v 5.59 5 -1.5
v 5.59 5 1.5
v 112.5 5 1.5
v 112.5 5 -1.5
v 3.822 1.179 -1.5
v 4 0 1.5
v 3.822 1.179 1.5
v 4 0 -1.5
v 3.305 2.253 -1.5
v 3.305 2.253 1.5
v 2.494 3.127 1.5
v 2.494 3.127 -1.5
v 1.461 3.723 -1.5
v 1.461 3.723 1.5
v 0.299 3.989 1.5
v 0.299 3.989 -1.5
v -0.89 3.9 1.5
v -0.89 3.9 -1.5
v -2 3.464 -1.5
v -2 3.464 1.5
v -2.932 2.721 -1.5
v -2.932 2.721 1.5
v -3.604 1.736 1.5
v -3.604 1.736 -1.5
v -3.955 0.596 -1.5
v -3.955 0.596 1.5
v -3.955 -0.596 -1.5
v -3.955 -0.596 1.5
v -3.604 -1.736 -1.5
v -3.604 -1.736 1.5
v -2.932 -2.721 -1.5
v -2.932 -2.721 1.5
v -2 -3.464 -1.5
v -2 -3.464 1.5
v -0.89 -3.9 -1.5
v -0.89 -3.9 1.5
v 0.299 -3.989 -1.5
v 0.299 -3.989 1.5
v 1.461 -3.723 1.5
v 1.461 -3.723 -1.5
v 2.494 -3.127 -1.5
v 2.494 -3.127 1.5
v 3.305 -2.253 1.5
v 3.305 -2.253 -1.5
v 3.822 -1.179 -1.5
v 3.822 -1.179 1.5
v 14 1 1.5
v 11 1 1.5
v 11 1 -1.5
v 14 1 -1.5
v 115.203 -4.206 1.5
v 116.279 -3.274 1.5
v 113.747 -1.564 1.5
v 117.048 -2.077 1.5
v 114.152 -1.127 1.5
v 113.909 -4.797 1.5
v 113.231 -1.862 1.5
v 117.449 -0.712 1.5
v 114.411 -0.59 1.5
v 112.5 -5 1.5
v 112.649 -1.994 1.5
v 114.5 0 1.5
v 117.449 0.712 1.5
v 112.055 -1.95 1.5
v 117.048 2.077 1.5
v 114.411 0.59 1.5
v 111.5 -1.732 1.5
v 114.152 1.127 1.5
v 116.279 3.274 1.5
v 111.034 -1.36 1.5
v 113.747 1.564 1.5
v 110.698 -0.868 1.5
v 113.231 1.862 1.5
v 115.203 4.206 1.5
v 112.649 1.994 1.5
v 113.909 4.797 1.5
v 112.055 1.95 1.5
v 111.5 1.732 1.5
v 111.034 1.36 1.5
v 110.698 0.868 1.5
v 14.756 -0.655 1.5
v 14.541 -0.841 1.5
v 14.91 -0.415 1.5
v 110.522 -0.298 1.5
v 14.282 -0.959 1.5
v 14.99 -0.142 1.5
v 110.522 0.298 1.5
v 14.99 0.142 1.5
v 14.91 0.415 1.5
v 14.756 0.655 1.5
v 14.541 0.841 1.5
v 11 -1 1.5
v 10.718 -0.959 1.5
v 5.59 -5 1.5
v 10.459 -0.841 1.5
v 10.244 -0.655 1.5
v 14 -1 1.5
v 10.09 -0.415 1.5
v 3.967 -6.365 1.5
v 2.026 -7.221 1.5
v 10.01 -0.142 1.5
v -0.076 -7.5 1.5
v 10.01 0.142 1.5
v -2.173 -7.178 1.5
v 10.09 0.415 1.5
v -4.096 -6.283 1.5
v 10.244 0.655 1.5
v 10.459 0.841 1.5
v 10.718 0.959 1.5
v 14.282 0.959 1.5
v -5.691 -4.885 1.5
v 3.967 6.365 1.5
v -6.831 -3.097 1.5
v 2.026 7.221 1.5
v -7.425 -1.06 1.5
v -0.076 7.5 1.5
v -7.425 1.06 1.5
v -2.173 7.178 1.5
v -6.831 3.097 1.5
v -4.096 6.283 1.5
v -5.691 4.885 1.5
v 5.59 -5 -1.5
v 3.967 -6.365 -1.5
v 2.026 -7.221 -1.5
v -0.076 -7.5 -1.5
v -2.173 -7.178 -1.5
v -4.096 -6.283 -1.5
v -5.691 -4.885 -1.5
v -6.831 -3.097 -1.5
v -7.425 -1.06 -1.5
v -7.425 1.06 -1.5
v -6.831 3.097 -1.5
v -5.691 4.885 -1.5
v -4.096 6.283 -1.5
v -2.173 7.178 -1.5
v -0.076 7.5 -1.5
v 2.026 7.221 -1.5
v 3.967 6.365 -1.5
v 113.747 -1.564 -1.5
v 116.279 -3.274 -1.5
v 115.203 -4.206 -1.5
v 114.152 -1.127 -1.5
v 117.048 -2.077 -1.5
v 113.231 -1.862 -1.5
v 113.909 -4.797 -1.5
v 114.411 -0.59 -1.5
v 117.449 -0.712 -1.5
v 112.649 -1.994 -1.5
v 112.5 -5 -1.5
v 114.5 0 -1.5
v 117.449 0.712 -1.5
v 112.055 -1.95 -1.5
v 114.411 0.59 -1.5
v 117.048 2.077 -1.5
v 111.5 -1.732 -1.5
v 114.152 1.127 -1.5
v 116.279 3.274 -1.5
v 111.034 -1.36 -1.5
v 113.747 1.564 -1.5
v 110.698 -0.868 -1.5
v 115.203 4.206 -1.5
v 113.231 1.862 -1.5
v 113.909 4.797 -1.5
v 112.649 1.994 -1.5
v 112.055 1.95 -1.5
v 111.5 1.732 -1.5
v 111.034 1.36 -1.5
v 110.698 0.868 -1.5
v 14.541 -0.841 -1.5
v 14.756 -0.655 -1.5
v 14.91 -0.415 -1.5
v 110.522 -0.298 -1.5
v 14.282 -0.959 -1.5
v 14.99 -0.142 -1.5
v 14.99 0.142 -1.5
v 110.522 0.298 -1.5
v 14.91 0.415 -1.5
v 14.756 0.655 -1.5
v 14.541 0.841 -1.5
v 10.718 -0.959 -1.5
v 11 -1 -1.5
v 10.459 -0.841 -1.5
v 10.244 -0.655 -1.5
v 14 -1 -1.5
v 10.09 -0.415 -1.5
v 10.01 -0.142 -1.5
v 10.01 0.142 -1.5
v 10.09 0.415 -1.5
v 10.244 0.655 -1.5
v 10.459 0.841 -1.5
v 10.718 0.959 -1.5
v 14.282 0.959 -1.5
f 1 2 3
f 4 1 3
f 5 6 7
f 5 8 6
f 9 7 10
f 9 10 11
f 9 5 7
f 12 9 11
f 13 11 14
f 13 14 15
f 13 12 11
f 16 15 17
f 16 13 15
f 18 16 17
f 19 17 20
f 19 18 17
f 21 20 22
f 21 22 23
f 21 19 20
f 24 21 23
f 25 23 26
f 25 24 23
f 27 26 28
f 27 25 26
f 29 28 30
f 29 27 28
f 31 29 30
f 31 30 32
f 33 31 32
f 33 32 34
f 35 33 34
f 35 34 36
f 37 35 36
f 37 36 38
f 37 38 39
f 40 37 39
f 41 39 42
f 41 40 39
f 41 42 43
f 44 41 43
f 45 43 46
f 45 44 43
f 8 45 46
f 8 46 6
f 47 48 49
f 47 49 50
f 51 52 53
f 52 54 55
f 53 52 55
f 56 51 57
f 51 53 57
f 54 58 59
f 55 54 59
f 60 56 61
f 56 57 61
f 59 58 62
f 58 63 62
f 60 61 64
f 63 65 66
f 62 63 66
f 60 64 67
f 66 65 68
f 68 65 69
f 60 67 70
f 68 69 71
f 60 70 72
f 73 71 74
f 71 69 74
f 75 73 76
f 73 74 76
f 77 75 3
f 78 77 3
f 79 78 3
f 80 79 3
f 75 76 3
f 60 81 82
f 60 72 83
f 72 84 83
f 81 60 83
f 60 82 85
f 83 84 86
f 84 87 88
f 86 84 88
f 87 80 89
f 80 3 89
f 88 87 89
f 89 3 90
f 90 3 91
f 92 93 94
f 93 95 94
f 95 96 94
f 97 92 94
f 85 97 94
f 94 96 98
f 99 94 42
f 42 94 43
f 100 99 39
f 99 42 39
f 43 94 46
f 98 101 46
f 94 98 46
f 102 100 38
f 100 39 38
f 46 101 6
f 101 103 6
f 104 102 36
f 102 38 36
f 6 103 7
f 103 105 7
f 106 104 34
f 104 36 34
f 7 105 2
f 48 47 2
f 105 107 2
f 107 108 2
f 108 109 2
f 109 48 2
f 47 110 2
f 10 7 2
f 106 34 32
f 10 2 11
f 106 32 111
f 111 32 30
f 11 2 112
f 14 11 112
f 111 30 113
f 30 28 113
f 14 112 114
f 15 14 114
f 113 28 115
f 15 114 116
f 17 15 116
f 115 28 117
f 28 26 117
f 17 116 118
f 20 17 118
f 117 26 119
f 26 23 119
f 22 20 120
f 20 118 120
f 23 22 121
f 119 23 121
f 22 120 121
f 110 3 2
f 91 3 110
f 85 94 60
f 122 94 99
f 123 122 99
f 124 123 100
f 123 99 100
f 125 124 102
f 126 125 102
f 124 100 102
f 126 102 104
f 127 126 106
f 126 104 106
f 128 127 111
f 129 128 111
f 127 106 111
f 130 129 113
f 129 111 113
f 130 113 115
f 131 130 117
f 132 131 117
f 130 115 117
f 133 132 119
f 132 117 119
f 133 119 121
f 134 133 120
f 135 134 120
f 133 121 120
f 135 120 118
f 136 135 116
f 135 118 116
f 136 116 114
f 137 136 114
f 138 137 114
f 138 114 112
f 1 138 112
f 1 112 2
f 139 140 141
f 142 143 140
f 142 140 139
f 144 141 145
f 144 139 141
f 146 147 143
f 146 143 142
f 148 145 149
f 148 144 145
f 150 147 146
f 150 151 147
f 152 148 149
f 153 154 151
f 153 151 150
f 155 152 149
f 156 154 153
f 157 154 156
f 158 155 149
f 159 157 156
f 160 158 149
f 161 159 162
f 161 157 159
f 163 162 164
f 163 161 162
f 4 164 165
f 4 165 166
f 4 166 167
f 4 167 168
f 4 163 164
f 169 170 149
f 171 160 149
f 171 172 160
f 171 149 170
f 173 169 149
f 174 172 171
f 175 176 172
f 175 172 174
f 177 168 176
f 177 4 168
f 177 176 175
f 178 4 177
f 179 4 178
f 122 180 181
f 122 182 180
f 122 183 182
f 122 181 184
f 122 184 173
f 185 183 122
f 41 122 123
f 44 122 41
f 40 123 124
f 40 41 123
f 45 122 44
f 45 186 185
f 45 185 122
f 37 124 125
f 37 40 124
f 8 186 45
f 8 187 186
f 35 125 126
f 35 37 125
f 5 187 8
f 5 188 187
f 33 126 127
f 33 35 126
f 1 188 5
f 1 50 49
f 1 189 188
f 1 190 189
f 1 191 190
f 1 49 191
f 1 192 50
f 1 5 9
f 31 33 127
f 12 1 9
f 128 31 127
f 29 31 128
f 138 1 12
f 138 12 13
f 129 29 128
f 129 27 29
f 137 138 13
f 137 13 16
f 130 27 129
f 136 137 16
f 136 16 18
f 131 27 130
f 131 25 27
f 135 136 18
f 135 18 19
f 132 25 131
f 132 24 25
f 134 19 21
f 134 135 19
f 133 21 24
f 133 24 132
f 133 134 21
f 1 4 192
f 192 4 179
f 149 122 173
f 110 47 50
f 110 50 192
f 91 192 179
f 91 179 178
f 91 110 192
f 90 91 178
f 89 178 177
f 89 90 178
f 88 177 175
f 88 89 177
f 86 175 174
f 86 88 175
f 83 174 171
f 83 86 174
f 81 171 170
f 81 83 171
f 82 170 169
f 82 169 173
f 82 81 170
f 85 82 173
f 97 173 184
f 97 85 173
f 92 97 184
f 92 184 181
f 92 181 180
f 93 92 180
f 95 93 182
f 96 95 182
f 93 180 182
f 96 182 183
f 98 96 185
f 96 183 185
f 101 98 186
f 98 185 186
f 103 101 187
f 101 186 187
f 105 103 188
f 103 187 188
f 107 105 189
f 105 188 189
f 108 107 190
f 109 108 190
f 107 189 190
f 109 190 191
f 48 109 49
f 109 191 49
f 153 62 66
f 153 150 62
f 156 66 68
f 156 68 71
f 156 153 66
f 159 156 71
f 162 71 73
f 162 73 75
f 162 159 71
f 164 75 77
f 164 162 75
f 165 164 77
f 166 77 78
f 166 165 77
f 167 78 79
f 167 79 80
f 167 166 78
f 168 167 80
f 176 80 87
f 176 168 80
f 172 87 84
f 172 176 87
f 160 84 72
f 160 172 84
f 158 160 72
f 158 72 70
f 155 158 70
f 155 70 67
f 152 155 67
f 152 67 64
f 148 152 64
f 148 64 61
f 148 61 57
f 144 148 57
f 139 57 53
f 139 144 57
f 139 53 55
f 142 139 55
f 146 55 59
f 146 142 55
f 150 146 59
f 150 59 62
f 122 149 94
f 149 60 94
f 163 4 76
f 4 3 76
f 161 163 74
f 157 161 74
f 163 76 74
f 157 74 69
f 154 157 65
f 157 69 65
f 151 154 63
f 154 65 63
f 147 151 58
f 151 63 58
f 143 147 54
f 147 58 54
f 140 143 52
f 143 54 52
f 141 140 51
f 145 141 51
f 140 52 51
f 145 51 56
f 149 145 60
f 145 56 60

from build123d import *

# Parameters (mm, degrees)
SKETCH_1_R      = 2
SKETCH_1_R_2    = 4
EXTRUDE_1_DEPTH = 1.5


with BuildPart() as part:
    # 草图1 → 凸台-拉伸1 (new, symmetric)
    with BuildSketch(Plane.XY):
        with BuildLine():
            Line((5.590169944, 5), (112.5, 5))
            ThreePointArc((112.5, 5), (117.5, 0), (112.5, -5))
            Line((112.5, -5), (5.590169944, -5))
            ThreePointArc((5.590169944, -5), (-7.5, 0), (5.590169944, 5))
        make_face()
        with Locations((112.5, 0)):
            Circle(SKETCH_1_R, mode=Mode.SUBTRACT)
        Circle(SKETCH_1_R_2, mode=Mode.SUBTRACT)
        with BuildLine():
            Line((11, 1), (14, 1))
            ThreePointArc((14, 1), (15, 0), (14, -1))
            Line((14, -1), (11, -1))
            ThreePointArc((11, -1), (10, 0), (11, 1))
        make_face(mode=Mode.SUBTRACT)
    extrude(amount=EXTRUDE_1_DEPTH, both=True)


solid = part.part
